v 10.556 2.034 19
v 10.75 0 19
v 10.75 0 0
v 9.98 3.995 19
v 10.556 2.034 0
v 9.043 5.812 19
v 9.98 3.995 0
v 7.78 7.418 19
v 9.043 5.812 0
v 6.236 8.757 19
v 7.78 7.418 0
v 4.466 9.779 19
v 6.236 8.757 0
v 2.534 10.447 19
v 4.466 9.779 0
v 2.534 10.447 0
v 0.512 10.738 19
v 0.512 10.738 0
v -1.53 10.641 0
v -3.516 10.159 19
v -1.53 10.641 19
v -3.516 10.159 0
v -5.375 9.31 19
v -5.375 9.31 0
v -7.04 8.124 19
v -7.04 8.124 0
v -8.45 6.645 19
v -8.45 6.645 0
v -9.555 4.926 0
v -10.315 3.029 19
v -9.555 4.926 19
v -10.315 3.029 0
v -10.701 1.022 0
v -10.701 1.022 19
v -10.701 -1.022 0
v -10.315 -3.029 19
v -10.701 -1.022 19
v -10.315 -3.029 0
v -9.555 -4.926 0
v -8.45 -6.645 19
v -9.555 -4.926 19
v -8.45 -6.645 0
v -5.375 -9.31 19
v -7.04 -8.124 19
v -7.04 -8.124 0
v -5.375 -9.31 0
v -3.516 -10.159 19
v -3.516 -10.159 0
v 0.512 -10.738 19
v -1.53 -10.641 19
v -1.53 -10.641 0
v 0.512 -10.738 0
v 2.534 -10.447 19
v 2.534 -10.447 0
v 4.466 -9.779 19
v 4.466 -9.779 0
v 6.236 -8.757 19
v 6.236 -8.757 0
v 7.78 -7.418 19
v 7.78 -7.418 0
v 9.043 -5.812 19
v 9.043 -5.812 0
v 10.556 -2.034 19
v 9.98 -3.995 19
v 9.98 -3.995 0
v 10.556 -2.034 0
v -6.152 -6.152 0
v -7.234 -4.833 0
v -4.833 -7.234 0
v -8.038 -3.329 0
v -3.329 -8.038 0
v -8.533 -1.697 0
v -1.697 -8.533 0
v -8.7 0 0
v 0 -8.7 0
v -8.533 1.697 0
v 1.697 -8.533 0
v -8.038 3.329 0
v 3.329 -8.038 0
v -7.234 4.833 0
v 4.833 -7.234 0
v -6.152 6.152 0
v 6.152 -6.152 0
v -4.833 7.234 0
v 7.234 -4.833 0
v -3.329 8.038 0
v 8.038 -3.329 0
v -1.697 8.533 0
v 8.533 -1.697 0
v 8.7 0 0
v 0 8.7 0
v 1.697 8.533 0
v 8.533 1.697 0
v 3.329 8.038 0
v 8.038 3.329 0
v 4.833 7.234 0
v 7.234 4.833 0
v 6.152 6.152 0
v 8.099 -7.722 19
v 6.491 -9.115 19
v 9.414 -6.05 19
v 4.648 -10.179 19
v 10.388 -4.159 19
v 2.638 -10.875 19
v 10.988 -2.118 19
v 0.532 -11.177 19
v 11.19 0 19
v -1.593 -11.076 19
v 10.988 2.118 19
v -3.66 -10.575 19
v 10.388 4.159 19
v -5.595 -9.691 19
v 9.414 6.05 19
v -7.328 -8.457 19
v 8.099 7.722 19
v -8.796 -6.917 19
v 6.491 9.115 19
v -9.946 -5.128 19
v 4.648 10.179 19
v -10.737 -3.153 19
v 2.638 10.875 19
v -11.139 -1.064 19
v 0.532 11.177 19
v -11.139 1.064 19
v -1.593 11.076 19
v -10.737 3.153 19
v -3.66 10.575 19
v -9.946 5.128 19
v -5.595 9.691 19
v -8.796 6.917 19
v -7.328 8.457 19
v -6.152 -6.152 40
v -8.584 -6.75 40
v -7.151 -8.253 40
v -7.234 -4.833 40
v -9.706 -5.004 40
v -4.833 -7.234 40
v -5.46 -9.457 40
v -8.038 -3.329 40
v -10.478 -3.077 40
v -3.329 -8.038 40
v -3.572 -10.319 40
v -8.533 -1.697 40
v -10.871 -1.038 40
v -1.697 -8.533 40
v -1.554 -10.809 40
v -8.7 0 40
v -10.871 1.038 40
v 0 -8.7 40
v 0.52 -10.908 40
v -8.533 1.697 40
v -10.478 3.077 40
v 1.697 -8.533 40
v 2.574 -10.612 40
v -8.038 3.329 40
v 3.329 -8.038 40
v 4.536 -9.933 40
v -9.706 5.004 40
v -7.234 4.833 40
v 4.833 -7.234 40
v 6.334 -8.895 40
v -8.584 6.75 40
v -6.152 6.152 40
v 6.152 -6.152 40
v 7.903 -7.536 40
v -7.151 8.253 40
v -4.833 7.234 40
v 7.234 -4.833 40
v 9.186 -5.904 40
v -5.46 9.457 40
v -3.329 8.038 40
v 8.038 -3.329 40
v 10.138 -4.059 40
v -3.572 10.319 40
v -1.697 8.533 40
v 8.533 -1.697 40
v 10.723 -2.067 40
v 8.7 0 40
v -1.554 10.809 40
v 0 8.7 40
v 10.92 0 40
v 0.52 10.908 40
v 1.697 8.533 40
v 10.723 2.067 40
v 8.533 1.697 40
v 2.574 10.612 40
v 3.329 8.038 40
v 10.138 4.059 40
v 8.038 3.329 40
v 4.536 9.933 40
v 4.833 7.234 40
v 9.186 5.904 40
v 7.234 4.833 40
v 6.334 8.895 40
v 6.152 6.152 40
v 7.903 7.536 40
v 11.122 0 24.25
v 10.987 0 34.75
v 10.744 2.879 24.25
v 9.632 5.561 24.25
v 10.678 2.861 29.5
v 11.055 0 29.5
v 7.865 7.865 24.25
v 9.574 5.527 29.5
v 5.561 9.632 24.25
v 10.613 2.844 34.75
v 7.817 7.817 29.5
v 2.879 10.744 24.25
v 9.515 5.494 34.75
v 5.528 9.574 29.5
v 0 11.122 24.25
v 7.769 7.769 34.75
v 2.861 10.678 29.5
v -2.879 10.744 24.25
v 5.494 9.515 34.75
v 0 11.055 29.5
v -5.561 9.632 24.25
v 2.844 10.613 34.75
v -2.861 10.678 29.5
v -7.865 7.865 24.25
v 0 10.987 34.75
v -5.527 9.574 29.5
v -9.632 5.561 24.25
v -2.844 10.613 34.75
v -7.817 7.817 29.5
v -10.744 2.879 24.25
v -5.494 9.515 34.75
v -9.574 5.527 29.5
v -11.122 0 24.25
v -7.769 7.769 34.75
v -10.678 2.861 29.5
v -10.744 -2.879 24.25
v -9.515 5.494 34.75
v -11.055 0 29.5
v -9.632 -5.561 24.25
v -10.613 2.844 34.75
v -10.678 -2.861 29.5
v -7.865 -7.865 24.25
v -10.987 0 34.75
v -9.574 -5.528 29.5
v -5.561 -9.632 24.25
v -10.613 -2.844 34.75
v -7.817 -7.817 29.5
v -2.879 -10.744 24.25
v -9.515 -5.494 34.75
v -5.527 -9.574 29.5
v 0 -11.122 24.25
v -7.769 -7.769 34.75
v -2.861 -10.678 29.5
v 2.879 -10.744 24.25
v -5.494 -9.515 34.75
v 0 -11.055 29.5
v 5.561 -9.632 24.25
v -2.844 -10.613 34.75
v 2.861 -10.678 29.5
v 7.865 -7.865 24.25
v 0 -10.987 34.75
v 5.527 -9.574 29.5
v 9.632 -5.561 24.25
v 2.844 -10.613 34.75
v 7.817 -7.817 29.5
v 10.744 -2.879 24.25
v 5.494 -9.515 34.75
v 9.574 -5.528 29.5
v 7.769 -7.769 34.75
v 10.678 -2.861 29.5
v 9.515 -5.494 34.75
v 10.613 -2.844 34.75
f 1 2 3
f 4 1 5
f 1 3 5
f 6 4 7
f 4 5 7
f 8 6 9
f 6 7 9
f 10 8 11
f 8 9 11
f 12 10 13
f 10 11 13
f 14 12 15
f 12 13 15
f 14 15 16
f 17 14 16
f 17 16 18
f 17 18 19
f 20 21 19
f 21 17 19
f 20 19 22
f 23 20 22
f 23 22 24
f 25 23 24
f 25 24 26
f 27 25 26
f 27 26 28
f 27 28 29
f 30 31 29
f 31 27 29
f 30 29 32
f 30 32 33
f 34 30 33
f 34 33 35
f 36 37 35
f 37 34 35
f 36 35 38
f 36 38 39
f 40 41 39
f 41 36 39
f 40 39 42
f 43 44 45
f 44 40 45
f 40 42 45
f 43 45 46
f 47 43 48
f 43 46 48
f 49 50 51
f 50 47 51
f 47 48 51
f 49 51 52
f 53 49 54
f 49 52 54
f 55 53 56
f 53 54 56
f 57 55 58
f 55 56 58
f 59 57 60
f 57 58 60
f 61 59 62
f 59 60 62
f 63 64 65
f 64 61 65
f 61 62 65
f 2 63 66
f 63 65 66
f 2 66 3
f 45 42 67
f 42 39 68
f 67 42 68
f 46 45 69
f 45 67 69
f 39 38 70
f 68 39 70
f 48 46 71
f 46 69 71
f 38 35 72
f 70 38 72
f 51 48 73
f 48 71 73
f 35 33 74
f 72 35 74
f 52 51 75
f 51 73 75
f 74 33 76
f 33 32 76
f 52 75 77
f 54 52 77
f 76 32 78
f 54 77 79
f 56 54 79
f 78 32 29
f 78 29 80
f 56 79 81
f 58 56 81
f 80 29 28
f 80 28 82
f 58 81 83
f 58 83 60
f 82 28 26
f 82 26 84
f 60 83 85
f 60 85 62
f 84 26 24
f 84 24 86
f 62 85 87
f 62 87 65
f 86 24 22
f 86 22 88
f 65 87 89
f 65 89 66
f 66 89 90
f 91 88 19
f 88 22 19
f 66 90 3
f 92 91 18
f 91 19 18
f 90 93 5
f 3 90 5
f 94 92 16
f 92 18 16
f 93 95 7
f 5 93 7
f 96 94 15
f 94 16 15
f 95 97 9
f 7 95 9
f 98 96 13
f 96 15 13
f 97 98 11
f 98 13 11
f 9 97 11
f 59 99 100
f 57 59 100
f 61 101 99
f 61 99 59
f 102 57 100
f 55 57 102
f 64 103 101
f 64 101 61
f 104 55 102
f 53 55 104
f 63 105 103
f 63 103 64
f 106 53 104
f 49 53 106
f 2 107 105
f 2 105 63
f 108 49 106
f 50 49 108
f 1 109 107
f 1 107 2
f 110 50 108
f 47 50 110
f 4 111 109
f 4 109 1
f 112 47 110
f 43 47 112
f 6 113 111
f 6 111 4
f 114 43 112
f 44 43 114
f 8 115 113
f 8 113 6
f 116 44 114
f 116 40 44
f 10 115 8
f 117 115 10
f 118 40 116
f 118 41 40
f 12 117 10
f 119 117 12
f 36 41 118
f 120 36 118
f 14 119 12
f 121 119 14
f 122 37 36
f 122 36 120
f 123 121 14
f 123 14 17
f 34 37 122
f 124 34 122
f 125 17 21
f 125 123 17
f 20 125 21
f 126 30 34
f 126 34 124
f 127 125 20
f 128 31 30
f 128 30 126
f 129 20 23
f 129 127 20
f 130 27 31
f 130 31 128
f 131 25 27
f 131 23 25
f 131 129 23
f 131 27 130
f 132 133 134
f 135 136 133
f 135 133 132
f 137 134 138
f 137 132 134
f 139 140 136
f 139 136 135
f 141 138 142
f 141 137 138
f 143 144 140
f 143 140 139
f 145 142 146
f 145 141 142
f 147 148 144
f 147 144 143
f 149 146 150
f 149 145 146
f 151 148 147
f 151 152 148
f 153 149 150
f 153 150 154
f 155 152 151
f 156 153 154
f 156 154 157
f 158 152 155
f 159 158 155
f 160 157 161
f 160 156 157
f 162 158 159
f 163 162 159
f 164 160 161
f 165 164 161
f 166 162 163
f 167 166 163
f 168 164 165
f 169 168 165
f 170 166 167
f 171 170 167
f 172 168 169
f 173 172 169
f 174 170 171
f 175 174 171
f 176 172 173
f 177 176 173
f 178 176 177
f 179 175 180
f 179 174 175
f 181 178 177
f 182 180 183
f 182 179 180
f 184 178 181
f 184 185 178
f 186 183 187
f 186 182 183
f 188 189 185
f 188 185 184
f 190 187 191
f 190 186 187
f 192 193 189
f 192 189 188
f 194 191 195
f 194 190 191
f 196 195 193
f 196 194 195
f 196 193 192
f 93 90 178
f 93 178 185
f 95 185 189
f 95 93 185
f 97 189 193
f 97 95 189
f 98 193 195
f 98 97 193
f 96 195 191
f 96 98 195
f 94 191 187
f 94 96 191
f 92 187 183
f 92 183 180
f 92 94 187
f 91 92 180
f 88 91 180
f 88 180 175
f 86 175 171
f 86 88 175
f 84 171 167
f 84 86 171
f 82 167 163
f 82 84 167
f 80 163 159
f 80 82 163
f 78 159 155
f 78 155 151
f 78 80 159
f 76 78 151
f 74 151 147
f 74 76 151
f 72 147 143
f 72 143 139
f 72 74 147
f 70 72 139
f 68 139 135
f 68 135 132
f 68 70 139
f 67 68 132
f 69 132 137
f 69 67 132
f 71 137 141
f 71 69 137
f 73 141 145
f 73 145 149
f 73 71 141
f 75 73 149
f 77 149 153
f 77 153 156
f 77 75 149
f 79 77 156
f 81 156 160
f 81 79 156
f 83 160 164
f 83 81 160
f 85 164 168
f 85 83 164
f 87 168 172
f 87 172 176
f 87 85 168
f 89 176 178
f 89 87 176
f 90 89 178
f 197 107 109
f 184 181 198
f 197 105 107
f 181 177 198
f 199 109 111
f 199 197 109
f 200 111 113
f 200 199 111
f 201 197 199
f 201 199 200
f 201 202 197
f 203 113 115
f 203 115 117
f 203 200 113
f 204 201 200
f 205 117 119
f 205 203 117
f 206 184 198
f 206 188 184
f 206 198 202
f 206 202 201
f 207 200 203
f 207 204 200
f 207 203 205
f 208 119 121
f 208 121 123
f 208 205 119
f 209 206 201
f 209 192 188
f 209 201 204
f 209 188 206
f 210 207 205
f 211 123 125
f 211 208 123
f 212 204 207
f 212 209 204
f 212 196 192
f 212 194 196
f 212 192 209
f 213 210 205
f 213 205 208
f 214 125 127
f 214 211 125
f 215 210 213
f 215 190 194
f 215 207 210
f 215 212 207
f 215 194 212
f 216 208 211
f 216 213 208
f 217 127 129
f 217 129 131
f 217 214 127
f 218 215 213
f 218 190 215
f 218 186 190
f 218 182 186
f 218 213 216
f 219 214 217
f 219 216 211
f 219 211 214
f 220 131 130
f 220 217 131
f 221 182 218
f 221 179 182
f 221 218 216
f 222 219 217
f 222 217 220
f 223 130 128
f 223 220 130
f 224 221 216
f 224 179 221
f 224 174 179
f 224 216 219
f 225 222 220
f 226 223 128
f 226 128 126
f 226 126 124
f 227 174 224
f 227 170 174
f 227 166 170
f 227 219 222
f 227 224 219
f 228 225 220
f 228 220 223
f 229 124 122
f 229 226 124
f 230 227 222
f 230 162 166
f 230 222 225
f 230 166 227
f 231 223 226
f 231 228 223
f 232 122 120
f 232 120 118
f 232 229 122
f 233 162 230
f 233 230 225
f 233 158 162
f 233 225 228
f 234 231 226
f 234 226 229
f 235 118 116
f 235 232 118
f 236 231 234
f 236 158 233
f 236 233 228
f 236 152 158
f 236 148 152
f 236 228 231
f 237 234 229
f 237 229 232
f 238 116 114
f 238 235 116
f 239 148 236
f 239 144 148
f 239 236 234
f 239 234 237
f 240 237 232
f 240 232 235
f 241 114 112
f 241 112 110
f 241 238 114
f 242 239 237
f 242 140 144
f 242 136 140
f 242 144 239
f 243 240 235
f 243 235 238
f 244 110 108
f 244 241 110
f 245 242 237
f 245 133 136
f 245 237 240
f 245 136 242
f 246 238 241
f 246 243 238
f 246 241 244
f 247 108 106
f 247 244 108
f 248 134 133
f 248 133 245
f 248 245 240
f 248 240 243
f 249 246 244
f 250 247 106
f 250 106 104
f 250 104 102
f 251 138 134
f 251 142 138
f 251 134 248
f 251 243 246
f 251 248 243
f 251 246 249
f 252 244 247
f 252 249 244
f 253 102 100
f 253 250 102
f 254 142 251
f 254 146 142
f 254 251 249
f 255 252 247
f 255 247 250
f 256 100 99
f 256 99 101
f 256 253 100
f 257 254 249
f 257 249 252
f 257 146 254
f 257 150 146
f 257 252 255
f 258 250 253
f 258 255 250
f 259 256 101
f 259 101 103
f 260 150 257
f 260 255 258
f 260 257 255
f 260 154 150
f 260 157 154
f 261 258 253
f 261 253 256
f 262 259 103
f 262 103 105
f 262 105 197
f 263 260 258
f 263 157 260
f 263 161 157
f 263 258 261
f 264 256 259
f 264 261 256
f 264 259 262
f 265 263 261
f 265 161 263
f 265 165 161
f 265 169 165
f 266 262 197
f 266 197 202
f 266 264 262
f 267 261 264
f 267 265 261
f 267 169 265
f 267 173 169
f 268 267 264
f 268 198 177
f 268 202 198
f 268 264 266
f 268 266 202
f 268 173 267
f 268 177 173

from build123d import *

# Parameters (mm, degrees)
CYLINDER005_R     = 8.7
CYLINDER005_DEPTH = 40
CYLINDER007_R     = 10.75
CYLINDER007_DEPTH = 40


with BuildPart() as outletextension:
    # Cylinder005 → Cylinder005 (new body)
    with BuildSketch(Plane.XY):
        Circle(CYLINDER005_R)
    extrude(amount=CYLINDER005_DEPTH)


with BuildPart() as housingoutlet:
    # Cylinder007 → Cylinder007 (new body)
    with BuildSketch(Plane.XY):
        Circle(CYLINDER007_R)
    extrude(amount=CYLINDER007_DEPTH)


with BuildPart() as bloweroutletadapter_v3:
    # Cone001 → Cone001 (revolve)
    with BuildSketch(Plane(origin=(0, 0, 19), x_dir=(1, 0, 0), z_dir=(0, -1, 0))):
        Polygon((0, 0), (11.19, 0), (10.92, 21), (0, 21), align=None)
    revolve(axis=Axis((0, 0, 19), (0, 0, 1)))

    # Fusion: union HousingOutlet
    add(housingoutlet.part)

    # Cut: cut OutletExtension
    add(outletextension.part, mode=Mode.SUBTRACT)


solid = bloweroutletadapter_v3.part
